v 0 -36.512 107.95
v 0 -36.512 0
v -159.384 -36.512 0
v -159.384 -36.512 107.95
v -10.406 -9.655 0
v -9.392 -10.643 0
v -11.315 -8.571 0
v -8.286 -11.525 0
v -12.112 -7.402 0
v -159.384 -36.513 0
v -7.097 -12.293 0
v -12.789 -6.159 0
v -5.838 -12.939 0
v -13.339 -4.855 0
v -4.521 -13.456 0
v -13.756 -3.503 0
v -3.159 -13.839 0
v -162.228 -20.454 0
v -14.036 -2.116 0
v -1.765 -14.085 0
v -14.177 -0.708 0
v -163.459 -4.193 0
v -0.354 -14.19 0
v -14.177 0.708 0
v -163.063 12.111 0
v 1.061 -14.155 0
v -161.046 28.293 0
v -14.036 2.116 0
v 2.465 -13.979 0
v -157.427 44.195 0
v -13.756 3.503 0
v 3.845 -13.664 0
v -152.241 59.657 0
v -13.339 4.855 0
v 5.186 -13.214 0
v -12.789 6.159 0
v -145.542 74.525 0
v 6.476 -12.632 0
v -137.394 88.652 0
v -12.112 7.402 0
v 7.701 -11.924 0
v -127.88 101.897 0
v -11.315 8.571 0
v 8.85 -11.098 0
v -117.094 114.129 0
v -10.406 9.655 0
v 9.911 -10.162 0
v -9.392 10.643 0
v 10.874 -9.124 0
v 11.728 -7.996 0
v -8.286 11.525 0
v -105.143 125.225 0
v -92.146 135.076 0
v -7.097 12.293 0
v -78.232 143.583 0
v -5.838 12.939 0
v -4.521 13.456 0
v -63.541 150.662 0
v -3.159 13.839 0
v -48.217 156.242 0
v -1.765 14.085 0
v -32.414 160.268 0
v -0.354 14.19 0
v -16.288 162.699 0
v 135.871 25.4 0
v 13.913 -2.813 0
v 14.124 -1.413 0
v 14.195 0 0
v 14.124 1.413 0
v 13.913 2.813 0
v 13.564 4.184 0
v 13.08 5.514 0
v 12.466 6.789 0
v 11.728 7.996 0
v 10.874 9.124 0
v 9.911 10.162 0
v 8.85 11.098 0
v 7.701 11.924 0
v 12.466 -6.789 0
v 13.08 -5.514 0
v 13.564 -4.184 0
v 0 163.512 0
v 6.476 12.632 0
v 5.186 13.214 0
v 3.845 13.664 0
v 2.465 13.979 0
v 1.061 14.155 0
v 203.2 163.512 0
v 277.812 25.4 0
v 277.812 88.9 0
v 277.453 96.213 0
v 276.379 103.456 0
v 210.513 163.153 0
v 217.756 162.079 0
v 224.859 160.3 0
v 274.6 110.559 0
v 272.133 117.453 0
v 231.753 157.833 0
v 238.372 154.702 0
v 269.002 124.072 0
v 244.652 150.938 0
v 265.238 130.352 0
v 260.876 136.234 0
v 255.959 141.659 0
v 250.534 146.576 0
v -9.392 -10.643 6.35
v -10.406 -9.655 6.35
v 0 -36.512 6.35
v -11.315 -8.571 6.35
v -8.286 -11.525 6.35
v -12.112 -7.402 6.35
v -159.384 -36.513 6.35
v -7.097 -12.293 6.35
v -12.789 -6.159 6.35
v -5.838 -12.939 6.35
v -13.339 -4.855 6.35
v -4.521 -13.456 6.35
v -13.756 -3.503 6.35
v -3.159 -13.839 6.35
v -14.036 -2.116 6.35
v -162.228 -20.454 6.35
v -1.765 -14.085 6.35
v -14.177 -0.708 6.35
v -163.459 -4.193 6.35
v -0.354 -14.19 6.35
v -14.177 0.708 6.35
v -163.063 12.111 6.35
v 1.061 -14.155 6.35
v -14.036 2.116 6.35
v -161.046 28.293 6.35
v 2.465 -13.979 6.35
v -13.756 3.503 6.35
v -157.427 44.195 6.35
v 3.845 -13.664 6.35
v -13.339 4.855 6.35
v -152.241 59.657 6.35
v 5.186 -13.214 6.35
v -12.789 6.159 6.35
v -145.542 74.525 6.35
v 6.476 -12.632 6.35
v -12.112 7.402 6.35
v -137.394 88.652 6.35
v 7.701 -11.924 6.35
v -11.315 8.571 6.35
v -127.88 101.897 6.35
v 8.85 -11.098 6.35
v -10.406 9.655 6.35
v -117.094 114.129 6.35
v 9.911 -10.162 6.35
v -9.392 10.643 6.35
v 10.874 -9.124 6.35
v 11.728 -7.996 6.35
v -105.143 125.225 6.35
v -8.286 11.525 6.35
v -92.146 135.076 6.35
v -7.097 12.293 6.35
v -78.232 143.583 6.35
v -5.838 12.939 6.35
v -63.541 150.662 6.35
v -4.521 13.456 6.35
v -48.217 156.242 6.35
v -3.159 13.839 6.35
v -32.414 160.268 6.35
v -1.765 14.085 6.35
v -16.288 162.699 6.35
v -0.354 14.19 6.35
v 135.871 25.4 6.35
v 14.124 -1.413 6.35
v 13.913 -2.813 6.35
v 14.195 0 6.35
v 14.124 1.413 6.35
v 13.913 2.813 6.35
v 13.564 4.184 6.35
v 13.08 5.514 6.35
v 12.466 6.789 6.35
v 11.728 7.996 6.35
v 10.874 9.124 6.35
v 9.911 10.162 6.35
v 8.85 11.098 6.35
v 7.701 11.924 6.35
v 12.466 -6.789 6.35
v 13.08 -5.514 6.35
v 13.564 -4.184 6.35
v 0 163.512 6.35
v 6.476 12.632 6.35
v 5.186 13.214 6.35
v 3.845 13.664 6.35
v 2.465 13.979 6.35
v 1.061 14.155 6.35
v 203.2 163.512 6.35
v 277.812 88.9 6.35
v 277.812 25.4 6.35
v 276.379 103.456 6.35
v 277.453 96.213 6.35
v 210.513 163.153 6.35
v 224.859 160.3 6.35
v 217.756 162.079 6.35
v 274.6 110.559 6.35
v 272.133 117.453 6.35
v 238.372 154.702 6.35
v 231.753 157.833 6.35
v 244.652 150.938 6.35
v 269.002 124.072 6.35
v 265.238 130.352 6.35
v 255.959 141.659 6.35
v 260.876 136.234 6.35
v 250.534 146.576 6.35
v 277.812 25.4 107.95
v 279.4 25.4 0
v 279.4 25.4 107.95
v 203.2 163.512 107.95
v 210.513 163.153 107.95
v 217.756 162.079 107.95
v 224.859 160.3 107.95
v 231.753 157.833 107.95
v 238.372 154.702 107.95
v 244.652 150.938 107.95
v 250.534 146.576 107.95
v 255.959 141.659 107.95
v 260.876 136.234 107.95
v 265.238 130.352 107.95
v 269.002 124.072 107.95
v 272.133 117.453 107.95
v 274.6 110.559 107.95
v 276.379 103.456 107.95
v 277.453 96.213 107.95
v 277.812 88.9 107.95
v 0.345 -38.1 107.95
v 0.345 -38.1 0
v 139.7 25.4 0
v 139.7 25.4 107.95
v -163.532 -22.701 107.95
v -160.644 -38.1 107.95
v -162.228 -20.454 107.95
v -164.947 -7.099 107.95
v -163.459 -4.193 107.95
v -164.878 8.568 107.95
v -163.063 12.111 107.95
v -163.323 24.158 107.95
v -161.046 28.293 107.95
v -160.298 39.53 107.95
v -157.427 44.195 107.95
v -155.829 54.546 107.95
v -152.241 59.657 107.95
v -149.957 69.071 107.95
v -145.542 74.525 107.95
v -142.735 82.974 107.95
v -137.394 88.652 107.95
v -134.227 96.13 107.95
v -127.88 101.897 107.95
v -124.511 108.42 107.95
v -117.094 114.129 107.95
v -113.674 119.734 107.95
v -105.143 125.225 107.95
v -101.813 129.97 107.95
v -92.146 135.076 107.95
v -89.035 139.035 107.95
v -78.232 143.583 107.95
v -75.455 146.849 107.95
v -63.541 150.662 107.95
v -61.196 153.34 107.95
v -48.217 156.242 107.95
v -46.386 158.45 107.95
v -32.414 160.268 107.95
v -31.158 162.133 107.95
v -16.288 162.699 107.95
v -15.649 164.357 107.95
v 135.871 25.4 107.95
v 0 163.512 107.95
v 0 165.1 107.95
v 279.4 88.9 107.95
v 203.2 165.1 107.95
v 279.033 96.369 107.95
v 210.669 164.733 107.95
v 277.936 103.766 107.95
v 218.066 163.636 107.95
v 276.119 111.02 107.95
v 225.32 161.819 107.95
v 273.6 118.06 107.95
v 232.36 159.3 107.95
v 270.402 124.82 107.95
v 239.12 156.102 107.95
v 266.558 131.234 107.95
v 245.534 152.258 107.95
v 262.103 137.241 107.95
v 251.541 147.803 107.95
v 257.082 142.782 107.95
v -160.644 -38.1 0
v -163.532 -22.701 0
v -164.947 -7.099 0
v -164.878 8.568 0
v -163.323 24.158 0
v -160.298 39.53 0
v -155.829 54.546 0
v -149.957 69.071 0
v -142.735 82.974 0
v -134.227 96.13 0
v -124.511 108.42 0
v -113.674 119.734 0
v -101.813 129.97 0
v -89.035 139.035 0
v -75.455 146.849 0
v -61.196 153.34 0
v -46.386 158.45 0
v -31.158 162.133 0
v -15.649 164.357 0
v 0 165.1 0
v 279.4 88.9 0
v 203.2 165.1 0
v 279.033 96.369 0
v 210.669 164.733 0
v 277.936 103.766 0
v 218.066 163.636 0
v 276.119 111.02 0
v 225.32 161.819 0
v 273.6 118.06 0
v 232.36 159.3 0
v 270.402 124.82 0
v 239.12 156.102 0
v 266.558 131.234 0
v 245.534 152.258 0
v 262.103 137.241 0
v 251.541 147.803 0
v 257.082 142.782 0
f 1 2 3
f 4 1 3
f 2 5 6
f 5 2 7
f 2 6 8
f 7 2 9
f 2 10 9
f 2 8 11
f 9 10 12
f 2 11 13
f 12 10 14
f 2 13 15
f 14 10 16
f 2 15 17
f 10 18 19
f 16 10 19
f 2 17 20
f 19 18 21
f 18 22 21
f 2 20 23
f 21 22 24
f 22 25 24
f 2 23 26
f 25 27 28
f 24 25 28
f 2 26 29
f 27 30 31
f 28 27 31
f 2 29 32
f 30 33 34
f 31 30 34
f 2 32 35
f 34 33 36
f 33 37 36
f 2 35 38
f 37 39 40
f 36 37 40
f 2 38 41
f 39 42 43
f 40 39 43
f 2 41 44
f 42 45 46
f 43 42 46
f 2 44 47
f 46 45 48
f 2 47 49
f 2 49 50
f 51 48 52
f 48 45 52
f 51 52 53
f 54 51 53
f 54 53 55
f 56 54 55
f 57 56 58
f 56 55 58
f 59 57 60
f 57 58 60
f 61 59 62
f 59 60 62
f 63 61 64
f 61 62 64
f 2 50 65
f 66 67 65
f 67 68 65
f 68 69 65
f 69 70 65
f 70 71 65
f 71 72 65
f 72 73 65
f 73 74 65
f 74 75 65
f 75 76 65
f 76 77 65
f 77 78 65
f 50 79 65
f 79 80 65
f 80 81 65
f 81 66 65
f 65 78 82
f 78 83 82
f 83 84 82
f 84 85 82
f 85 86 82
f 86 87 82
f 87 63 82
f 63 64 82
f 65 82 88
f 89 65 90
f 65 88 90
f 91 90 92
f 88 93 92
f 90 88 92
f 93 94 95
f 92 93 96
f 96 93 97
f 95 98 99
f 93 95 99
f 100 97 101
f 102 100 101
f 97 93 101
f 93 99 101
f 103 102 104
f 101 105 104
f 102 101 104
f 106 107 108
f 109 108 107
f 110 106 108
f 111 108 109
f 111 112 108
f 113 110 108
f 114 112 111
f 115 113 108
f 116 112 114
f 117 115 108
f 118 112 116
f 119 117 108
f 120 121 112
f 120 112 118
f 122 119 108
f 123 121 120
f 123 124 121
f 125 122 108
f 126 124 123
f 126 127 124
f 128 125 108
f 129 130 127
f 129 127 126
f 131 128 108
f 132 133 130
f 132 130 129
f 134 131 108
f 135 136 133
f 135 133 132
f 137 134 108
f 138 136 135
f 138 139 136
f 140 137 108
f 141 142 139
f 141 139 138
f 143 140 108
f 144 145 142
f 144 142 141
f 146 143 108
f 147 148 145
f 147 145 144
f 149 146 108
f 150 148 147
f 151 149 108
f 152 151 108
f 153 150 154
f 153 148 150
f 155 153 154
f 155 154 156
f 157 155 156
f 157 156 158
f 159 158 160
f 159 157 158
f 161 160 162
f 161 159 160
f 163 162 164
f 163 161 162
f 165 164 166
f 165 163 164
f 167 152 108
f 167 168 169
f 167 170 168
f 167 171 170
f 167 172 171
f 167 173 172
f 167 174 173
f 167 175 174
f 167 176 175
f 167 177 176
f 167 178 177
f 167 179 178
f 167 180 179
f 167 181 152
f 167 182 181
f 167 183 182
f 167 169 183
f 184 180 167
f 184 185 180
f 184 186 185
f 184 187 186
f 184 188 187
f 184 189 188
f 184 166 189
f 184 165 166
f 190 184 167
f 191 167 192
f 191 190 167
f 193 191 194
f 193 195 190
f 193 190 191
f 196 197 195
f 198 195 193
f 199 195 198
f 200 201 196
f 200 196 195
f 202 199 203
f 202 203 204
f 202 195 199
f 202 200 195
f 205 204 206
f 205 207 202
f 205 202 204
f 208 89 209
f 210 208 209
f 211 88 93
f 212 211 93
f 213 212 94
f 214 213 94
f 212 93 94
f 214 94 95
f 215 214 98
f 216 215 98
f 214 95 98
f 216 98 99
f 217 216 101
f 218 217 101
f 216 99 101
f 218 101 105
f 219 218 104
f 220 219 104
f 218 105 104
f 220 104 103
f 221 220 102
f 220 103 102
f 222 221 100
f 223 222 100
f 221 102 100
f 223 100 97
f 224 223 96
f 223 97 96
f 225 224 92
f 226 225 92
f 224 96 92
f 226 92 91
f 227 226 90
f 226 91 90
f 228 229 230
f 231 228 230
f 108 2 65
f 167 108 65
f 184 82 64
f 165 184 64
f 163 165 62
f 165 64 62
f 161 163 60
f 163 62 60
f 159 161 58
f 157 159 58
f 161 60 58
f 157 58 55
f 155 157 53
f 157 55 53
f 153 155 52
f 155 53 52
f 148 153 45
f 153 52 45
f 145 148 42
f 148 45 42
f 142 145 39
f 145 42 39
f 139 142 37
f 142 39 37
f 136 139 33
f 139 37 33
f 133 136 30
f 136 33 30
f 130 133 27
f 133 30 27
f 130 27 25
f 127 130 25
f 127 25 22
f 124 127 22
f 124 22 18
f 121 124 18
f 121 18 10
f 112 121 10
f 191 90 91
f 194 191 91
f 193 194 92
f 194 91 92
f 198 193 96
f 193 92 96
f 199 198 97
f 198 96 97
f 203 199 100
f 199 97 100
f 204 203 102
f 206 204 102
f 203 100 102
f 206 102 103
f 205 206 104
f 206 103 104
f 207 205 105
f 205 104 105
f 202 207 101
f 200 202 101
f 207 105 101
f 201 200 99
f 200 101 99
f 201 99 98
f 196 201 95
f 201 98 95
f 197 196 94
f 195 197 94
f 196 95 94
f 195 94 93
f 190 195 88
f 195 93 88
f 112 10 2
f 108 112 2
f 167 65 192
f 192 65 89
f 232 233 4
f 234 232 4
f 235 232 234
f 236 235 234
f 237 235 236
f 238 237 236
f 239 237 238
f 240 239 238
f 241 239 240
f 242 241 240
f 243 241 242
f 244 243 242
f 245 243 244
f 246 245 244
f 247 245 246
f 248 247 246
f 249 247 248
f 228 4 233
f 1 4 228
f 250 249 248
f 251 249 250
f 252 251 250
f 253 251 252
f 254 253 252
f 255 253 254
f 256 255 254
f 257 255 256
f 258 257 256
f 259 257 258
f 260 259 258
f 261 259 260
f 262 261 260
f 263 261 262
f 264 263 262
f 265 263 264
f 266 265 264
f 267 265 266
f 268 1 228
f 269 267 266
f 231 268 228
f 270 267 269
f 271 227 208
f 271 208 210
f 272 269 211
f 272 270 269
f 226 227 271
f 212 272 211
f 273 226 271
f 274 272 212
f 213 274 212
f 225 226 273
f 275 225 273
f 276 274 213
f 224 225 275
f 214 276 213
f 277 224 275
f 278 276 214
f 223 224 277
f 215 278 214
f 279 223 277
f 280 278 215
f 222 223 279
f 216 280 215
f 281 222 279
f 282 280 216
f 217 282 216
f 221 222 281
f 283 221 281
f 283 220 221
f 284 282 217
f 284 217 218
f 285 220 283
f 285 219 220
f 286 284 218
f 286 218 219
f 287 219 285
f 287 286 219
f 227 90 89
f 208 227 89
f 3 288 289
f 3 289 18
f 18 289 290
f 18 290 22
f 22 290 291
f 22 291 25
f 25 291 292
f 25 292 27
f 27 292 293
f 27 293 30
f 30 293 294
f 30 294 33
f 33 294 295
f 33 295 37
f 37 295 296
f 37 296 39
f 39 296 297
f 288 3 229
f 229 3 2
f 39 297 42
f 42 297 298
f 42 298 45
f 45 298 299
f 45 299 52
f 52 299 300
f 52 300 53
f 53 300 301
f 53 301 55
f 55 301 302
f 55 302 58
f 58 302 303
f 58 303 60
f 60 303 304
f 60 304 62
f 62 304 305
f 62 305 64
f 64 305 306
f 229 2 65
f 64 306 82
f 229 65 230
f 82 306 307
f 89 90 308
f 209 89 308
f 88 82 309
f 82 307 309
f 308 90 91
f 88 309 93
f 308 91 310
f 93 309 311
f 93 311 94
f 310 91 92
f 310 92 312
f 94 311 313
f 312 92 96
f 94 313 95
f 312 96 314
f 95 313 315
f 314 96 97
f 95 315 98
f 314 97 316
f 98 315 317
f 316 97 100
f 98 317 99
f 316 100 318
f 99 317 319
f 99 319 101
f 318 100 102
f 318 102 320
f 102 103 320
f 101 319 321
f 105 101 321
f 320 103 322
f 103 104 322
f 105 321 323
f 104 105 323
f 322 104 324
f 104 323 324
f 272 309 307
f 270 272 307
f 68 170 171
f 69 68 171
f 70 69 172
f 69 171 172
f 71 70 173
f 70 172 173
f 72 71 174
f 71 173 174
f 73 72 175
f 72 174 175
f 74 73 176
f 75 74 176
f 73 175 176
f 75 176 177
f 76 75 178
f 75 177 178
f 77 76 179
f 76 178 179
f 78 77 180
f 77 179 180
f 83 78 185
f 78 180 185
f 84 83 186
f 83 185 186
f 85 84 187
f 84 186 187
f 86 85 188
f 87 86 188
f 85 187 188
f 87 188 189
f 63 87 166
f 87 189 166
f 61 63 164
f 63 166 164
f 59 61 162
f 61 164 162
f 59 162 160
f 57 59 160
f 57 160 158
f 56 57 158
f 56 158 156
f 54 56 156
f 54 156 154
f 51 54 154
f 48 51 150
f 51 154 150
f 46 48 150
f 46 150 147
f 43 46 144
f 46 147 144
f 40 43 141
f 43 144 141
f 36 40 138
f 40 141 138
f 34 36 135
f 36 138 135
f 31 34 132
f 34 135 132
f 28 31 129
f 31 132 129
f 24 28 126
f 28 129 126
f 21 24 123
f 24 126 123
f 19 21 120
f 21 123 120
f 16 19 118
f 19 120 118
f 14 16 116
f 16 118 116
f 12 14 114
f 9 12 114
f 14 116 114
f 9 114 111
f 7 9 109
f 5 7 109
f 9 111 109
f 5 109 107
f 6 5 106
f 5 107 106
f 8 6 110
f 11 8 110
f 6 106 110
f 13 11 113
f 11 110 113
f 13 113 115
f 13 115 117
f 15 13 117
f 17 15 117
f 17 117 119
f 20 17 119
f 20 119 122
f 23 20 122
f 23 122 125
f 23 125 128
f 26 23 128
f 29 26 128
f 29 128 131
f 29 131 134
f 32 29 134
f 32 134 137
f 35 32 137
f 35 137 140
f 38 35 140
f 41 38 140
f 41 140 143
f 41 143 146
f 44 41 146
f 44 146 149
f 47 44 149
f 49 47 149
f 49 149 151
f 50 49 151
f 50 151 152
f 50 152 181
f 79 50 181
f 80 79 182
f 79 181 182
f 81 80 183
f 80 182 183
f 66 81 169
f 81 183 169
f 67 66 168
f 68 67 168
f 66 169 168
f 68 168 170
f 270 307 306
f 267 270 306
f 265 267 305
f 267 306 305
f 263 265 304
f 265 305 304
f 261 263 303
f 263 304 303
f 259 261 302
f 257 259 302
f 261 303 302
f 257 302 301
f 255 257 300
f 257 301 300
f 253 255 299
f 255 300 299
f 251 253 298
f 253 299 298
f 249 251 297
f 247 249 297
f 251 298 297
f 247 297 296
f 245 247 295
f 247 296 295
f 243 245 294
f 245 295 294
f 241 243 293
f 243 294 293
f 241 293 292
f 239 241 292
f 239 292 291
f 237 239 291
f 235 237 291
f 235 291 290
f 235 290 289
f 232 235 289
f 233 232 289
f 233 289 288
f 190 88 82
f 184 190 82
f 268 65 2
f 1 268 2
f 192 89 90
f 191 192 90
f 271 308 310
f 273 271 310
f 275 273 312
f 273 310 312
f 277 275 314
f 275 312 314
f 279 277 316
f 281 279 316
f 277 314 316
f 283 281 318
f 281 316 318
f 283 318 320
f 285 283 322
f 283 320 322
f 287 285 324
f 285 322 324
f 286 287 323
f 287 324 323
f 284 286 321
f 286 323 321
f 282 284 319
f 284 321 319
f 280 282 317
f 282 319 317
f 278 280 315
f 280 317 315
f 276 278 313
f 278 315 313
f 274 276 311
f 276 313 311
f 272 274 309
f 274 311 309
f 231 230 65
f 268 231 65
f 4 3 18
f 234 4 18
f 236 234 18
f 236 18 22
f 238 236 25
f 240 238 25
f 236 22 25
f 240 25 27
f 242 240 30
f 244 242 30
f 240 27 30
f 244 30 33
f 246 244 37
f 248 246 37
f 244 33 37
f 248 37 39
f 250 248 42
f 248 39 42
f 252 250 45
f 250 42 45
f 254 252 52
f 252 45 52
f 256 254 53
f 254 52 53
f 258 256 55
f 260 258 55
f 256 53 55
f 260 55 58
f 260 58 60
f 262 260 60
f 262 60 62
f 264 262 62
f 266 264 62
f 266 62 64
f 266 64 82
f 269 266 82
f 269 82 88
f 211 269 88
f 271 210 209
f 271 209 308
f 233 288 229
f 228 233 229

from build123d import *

# Parameters (mm, degrees)
F1_DEPTH = 107.95
F2_DEPTH = 6.35
F3_R     = 14.19479
F4_DEPTH = 6.35


with BuildPart() as f1:
    # F0 (on Top) → F1 (new body)
    with BuildSketch(Plane.XY):
        with BuildLine():
            Line((203.2, 165.1), (0, 165.1))
            ThreePointArc((0, 165.1), (-129.515096, 102.390673), (-160.643705, -38.1))
            Line((-160.643705, -38.1), (0.344641, -38.1))
            Line((0.344641, -38.1), (139.7, 25.4))
            Line((139.7, 25.4), (135.871475, 25.4))
            Line((135.871475, 25.4), (0, -36.5125))
            Line((0, -36.5125), (-159.383735, -36.5125))
            ThreePointArc((-159.383735, -36.5125), (-127.879998, 101.897222), (0, 163.5125))
            Line((0, 163.5125), (203.2, 163.5125))
            ThreePointArc((203.2, 163.5125), (255.959005, 141.659005), (277.8125, 88.9))
            Line((277.8125, 88.9), (277.8125, 26.9875))
            Line((277.8125, 26.9875), (277.8125, 25.4))
            Line((277.8125, 25.4), (279.4, 25.4))
            Line((279.4, 25.4), (279.4, 88.9))
            ThreePointArc((279.4, 88.9), (257.081537, 142.781537), (203.2, 165.1))
        make_face()
    extrude(amount=F1_DEPTH)


with BuildPart() as f2:
    # F0 (on Top) → F2 (new body)
    with BuildSketch(Plane.XY):
        with BuildLine():
            Line((135.871475, 25.4), (139.7, 25.4))
            Line((139.7, 25.4), (277.8125, 25.4))
            Line((277.8125, 25.4), (277.8125, 26.9875))
            Line((277.8125, 26.9875), (277.8125, 88.9))
            ThreePointArc((277.8125, 88.9), (255.959005, 141.659005), (203.2, 163.5125))
            Line((203.2, 163.5125), (0, 163.5125))
            ThreePointArc((0, 163.5125), (-127.879998, 101.897222), (-159.383735, -36.5125))
            Line((-159.383735, -36.5125), (0, -36.5125))
            Line((0, -36.5125), (135.871475, 25.4))
        make_face()
    extrude(amount=F2_DEPTH)

    # F3 (on face) → F4 (cut)
    with BuildSketch(Plane.XY.offset(6.35)):
        Circle(F3_R)
    extrude(amount=-F4_DEPTH, mode=Mode.SUBTRACT)


solid = Compound([f1.part, f2.part])
